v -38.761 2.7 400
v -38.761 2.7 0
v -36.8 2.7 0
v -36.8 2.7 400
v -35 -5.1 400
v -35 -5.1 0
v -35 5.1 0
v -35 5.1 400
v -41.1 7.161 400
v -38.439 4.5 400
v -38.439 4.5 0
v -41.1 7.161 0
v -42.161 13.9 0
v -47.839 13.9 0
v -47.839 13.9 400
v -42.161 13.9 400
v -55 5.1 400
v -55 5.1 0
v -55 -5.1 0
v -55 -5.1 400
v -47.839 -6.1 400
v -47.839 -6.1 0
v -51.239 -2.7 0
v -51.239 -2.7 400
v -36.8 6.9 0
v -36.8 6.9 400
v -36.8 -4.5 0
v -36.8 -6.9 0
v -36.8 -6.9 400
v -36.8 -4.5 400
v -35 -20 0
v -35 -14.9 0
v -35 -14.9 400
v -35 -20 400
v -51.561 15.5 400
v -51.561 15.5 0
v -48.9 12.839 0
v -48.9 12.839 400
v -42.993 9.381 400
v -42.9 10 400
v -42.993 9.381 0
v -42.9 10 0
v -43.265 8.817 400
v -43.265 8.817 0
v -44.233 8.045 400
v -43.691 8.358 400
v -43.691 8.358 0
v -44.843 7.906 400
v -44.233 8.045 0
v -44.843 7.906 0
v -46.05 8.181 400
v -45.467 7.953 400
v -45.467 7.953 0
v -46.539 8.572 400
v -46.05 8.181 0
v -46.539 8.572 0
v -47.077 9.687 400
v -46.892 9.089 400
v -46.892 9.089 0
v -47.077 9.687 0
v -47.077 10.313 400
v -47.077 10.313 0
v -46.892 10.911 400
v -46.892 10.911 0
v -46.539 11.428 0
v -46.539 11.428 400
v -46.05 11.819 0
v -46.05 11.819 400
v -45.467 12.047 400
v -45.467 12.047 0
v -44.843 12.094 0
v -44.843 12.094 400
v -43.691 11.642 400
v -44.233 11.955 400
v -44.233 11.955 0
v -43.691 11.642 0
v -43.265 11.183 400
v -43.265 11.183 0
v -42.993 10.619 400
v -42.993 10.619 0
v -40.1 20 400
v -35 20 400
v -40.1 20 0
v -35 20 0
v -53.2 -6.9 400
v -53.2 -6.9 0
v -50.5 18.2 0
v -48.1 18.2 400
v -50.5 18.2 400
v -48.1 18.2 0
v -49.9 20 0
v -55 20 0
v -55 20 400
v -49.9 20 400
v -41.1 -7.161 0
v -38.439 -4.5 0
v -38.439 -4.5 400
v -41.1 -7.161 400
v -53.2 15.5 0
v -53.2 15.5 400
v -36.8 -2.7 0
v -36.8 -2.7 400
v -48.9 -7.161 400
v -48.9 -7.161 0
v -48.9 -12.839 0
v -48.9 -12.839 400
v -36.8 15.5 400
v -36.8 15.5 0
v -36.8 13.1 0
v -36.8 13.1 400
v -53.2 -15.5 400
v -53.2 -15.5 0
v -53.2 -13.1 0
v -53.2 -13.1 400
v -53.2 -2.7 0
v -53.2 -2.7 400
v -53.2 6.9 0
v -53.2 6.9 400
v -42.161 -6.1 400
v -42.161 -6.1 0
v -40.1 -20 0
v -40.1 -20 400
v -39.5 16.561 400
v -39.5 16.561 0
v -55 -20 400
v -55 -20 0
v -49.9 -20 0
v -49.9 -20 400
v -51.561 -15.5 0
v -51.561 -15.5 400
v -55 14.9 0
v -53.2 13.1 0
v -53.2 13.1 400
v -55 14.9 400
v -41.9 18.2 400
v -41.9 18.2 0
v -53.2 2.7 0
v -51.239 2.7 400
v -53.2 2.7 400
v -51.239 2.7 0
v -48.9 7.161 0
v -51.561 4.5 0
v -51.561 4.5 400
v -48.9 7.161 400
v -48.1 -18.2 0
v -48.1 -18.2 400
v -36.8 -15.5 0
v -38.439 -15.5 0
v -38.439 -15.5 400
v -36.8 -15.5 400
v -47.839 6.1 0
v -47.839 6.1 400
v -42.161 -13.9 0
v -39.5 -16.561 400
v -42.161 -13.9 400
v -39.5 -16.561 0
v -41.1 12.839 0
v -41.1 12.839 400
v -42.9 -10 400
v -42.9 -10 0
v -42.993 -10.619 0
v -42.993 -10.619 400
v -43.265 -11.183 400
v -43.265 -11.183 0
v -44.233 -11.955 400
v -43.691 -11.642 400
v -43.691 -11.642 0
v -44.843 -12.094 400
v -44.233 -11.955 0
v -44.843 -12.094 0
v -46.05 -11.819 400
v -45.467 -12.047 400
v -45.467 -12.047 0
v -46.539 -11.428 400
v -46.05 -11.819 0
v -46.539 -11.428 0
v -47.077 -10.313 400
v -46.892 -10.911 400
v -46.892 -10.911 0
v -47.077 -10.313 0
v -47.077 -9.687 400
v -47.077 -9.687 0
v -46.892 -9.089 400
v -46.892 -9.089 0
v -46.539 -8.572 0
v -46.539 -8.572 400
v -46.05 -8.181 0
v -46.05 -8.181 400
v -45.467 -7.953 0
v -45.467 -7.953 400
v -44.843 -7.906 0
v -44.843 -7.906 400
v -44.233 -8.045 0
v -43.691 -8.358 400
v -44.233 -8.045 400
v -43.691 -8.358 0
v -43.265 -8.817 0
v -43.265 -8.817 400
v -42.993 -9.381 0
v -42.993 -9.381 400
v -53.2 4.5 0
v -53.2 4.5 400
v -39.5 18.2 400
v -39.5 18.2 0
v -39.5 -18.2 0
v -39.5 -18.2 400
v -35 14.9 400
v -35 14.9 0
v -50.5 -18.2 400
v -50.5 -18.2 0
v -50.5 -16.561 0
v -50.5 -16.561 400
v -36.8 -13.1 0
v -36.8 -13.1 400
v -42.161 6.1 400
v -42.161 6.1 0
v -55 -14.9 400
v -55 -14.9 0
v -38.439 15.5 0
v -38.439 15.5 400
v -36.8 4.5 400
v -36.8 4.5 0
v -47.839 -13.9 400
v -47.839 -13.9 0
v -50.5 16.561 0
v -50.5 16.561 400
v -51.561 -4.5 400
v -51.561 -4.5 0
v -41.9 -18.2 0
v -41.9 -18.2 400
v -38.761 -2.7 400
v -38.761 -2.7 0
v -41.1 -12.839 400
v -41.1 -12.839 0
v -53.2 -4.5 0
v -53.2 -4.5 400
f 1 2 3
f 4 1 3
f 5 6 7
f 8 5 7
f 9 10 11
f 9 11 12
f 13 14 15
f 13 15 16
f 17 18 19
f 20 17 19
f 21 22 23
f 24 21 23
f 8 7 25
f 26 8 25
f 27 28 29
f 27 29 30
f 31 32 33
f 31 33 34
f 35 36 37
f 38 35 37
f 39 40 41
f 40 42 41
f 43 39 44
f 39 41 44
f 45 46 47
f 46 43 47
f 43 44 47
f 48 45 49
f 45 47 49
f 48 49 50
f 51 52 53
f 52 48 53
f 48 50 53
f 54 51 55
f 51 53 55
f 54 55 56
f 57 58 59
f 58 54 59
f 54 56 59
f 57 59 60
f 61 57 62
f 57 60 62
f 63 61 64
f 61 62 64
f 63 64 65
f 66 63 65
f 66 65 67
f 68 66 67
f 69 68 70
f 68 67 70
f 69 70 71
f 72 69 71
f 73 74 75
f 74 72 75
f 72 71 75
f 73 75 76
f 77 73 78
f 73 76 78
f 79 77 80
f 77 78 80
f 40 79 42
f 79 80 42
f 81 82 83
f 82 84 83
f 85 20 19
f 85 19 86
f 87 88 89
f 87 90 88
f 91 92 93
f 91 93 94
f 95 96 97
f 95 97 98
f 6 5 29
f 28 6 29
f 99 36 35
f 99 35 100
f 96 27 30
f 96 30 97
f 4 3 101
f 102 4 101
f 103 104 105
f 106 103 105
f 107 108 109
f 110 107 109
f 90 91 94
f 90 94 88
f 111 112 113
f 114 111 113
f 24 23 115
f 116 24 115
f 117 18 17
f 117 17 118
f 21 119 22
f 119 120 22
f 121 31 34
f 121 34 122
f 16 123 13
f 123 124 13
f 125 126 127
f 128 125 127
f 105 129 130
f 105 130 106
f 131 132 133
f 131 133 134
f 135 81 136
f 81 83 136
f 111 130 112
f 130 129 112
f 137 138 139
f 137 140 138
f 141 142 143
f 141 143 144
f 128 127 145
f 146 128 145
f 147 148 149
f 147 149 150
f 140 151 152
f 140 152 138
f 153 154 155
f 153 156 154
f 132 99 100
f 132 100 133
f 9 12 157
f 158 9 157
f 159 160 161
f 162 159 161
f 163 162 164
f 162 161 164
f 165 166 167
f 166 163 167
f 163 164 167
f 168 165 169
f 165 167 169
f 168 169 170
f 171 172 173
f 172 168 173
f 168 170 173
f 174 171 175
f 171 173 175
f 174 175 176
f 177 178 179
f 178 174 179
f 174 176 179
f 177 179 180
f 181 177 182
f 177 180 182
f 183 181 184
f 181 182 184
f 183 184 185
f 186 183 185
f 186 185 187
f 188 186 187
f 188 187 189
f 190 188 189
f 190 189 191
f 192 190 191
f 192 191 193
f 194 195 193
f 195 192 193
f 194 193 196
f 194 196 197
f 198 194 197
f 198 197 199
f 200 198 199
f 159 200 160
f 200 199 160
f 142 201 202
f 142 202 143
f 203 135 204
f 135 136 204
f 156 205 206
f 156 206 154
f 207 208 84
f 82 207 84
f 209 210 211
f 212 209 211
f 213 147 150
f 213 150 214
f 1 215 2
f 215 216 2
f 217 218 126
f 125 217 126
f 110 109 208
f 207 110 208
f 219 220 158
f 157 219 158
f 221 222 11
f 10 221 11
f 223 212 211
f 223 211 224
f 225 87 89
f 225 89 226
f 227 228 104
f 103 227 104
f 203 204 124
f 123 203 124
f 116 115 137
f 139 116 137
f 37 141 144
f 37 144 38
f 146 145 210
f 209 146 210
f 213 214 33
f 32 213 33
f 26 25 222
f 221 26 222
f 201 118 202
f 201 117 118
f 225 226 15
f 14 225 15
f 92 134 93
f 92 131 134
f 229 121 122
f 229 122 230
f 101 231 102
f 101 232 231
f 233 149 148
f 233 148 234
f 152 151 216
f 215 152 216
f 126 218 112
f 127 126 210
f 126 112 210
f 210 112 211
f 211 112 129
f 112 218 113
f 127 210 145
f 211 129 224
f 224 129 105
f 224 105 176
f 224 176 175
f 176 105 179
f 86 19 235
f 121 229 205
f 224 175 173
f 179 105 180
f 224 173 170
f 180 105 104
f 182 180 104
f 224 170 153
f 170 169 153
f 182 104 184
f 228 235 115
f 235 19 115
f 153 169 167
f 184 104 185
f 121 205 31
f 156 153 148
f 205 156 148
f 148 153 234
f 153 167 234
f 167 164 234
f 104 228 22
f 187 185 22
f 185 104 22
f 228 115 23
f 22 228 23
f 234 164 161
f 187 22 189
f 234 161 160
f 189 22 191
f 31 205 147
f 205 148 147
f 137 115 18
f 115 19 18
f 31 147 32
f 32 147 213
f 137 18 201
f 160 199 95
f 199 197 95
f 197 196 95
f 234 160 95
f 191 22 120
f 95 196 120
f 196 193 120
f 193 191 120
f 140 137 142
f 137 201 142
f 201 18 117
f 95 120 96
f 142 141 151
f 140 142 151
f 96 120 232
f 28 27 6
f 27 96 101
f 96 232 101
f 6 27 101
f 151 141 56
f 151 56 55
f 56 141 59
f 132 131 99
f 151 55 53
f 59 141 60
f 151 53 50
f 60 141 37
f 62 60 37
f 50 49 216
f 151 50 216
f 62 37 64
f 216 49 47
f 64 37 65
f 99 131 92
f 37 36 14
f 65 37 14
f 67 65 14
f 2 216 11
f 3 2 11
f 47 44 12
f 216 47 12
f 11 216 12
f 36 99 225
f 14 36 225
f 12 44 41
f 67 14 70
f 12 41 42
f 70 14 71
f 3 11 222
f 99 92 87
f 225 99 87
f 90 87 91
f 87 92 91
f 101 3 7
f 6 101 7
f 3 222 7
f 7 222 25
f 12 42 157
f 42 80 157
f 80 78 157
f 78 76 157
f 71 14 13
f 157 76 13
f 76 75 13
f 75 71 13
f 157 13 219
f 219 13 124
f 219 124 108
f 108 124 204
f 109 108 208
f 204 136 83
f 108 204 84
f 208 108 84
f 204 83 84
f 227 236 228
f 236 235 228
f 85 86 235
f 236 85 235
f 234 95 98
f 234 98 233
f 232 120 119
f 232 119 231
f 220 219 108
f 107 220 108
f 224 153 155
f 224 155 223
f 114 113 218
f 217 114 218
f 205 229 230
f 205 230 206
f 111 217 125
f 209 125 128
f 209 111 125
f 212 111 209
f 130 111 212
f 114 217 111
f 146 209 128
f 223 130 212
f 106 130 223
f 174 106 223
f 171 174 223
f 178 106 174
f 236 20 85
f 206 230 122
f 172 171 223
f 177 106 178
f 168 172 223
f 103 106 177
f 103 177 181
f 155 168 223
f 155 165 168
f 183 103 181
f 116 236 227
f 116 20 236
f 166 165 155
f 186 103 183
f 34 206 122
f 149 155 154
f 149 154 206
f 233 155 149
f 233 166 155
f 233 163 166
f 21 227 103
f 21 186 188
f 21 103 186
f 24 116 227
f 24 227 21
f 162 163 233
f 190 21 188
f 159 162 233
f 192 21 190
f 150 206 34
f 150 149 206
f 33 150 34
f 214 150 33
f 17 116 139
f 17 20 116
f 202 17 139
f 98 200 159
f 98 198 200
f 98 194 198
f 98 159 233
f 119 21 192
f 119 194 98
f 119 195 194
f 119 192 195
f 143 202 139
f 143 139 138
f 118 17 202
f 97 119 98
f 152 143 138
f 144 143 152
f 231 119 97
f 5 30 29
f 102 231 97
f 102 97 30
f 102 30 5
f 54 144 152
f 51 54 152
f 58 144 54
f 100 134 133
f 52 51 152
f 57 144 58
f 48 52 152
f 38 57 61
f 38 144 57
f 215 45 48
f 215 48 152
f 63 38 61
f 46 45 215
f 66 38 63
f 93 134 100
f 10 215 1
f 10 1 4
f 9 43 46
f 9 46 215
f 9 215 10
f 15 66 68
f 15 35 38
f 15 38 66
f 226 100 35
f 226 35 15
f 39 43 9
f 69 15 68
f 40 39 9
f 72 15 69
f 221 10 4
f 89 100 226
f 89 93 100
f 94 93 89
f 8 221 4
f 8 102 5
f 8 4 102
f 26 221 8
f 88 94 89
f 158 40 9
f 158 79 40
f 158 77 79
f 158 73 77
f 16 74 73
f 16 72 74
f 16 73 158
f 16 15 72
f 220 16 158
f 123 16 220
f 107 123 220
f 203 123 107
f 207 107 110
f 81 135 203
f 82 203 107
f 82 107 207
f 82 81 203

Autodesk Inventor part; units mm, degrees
ref_plane "YZ Plane" through (0, 0, 0) normal (1, 0, 0) x (0, 1, 0)
ref_plane "XZ Plane" through (0, 0, 0) normal (0, 1, 0) x (-1, 0, 0)
ref_plane "XY Plane" through (0, 0, 0) normal (0, 0, 1) x (1, 0, 0)
sketch "Boceto1" plane through (0, 0, 0) normal (0, 0, 1) x (1, 0, 0)
  line L0 (-49.9, -20) -> (-45, -20)
  line L1 (-47.8393, -13.9) -> (-45, -13.9)
  line L2 (-50.5, -16.5607) -> (-47.8393, -13.9)
  line L3 (-50.5, -18.2) -> (-50.5, -16.5607)
  line L4 (-48.1, -18.2) -> (-50.5, -18.2)
  line L5 (-49.9, -20) -> (-48.1, -18.2)
  line L6 (-55, -20) -> (-45, -20)
  line L7 (-55, -5.1) -> (-55, -20)
  line L8 (-53.2, -13.1) -> (-55, -14.9)
  line L9 (-53.2, -15.5) -> (-53.2, -13.1)
  line L10 (-51.5606, -15.5) -> (-48.9, -12.8393)
  line L11 (-48.9, -7.1607) -> (-48.9, -12.8393)
  circle A0 centre (-45, -10) radius 2.1
  line L12 (-47.8393, -6.1) -> (-51.2393, -2.7)
  line L13 (-51.5607, -4.5) -> (-48.9, -7.1607)
  line L14 (-53.2, -4.5) -> (-51.5607, -4.5)
  line L15 (-51.2393, -2.7) -> (-53.2, -2.7)
  line L16 (-53.2, -6.9) -> (-53.2, -4.5)
  line L17 (-55, -5.1) -> (-53.2, -6.9)
  line L18 (-51.5606, -15.5) -> (-53.2, -15.5)
  line L19 (-35, 0) -> (-55, 0) construction
  line L20 (-53.2, 0) -> (-53.2, -4.5)
  line L21 (-55, 0) -> (-55, -5.1)
  line L22 (-45, 0) -> (-45, -20) construction
  line L23 (-45, -6.1) -> (-47.8393, -6.1)
  line L24 (-40.1, -20) -> (-45, -20)
  line L25 (-42.1606, -13.9) -> (-45, -13.9)
  line L26 (-39.5, -16.5607) -> (-42.1606, -13.9)
  line L27 (-39.5, -18.2) -> (-39.5, -16.5607)
  line L28 (-41.9, -18.2) -> (-39.5, -18.2)
  line L29 (-40.1, -20) -> (-41.9, -18.2)
  line L30 (-35, -20) -> (-45, -20)
  line L31 (-35, -5.1) -> (-35, -20)
  line L32 (-36.8, -13.1) -> (-35, -14.9)
  line L33 (-36.8, -15.5) -> (-36.8, -13.1)
  line L34 (-38.4393, -15.5) -> (-41.1, -12.8393)
  line L35 (-41.1, -7.1607) -> (-41.1, -12.8393)
  line L36 (-42.1606, -6.1) -> (-38.7607, -2.7)
  line L37 (-38.4393, -4.5) -> (-41.1, -7.1607)
  line L38 (-36.8, -4.5) -> (-38.4393, -4.5)
  line L39 (-38.7607, -2.7) -> (-36.8, -2.7)
  line L40 (-36.8, -6.9) -> (-36.8, -4.5)
  line L41 (-35, -5.1) -> (-36.8, -6.9)
  line L42 (-38.4393, -15.5) -> (-36.8, -15.5)
  line L43 (-36.8, 0) -> (-36.8, -4.5)
  line L44 (-35, 0) -> (-35, -5.1)
  line L45 (-45, -6.1) -> (-42.1606, -6.1)
  line L46 (-49.9, 20) -> (-45, 20)
  line L47 (-47.8393, 13.9) -> (-45, 13.9)
  line L48 (-50.5, 16.5607) -> (-47.8393, 13.9)
  line L49 (-50.5, 18.2) -> (-50.5, 16.5607)
  line L50 (-48.1, 18.2) -> (-50.5, 18.2)
  line L51 (-49.9, 20) -> (-48.1, 18.2)
  line L52 (-55, 20) -> (-45, 20)
  line L53 (-55, 5.1) -> (-55, 20)
  line L54 (-53.2, 13.1) -> (-55, 14.9)
  line L55 (-53.2, 15.5) -> (-53.2, 13.1)
  line L56 (-51.5606, 15.5) -> (-48.9, 12.8393)
  line L57 (-48.9, 7.1607) -> (-48.9, 12.8393)
  circle A1 centre (-45, 10) radius 2.1
  line L58 (-47.8393, 6.1) -> (-51.2393, 2.7)
  line L59 (-51.5607, 4.5) -> (-48.9, 7.1607)
  line L60 (-53.2, 4.5) -> (-51.5607, 4.5)
  line L61 (-51.2393, 2.7) -> (-53.2, 2.7)
  line L62 (-53.2, 6.9) -> (-53.2, 4.5)
  line L63 (-55, 5.1) -> (-53.2, 6.9)
  line L64 (-51.5606, 15.5) -> (-53.2, 15.5)
  line L65 (-53.2, 0) -> (-53.2, 4.5)
  line L66 (-55, 0) -> (-55, 5.1)
  line L67 (-45, 0) -> (-45, 20) construction
  line L68 (-45, 6.1) -> (-47.8393, 6.1)
  line L69 (-40.1, 20) -> (-45, 20)
  line L70 (-42.1606, 13.9) -> (-45, 13.9)
  line L71 (-39.5, 16.5607) -> (-42.1606, 13.9)
  line L72 (-39.5, 18.2) -> (-39.5, 16.5607)
  line L73 (-41.9, 18.2) -> (-39.5, 18.2)
  line L74 (-40.1, 20) -> (-41.9, 18.2)
  line L75 (-36.8, 13.1) -> (-35, 14.9)
  line L76 (-36.8, 15.5) -> (-36.8, 13.1)
  line L77 (-38.4393, 15.5) -> (-36.8, 15.5)
  line L78 (-35, 20) -> (-45, 20)
  line L79 (-35, 5.1) -> (-35, 20)
  line L80 (-38.4393, 15.5) -> (-41.1, 12.8393)
  line L81 (-41.1, 7.1607) -> (-41.1, 12.8393)
  line L82 (-45, 6.1) -> (-42.1606, 6.1)
  line L83 (-38.4393, 4.5) -> (-41.1, 7.1607)
  line L84 (-36.8, 4.5) -> (-38.4393, 4.5)
  line L85 (-42.1606, 6.1) -> (-38.7607, 2.7)
  line L86 (-38.7607, 2.7) -> (-36.8, 2.7)
  line L87 (-36.8, 0) -> (-36.8, 4.5)
  line L88 (-35, 0) -> (-35, 5.1)
  line L89 (-35, 5.1) -> (-36.8, 6.9)
  line L90 (-36.8, 6.9) -> (-36.8, 4.5)
  point P0 (0, 0)
  point P1 (-45, -10)
  point P2 (-45, -10)
  point P3 (-45, 10)
  point P4 (-45, 10)
extrude "Extrusión1" add sketch "Boceto1" along normal blind 400 contours L6 L7 L8 L9 L18 L10 L11 L13 L14 L20 L15 L12 L23 L45 L36 L39 L43 L38 L37 L35 L34 L42 L33 L32 L31 L30 L29 L28 L27 L26 L25 L1 L2 L3 L4 L5 | L21 L66 L63 L62 L65 L20 L16 L17 | L41 L40 L43 L87 L90 L89 L88 L44 | L53 L52 L51 L50 L49 L48 L47 L70 L71 L72 L73 L74 L78 L79 L75 L76 L77 L80 L81 L83 L84 L87 L86 L85 L82 L68 L58 L61 L65 L60 L59 L57 L56 L64 L55 L54
ref_plane "Plano de trabajo1" through (-45, 5.1, 400) normal (1, 0, 0) x (0, 0, -1)
properties part number "Barra"
